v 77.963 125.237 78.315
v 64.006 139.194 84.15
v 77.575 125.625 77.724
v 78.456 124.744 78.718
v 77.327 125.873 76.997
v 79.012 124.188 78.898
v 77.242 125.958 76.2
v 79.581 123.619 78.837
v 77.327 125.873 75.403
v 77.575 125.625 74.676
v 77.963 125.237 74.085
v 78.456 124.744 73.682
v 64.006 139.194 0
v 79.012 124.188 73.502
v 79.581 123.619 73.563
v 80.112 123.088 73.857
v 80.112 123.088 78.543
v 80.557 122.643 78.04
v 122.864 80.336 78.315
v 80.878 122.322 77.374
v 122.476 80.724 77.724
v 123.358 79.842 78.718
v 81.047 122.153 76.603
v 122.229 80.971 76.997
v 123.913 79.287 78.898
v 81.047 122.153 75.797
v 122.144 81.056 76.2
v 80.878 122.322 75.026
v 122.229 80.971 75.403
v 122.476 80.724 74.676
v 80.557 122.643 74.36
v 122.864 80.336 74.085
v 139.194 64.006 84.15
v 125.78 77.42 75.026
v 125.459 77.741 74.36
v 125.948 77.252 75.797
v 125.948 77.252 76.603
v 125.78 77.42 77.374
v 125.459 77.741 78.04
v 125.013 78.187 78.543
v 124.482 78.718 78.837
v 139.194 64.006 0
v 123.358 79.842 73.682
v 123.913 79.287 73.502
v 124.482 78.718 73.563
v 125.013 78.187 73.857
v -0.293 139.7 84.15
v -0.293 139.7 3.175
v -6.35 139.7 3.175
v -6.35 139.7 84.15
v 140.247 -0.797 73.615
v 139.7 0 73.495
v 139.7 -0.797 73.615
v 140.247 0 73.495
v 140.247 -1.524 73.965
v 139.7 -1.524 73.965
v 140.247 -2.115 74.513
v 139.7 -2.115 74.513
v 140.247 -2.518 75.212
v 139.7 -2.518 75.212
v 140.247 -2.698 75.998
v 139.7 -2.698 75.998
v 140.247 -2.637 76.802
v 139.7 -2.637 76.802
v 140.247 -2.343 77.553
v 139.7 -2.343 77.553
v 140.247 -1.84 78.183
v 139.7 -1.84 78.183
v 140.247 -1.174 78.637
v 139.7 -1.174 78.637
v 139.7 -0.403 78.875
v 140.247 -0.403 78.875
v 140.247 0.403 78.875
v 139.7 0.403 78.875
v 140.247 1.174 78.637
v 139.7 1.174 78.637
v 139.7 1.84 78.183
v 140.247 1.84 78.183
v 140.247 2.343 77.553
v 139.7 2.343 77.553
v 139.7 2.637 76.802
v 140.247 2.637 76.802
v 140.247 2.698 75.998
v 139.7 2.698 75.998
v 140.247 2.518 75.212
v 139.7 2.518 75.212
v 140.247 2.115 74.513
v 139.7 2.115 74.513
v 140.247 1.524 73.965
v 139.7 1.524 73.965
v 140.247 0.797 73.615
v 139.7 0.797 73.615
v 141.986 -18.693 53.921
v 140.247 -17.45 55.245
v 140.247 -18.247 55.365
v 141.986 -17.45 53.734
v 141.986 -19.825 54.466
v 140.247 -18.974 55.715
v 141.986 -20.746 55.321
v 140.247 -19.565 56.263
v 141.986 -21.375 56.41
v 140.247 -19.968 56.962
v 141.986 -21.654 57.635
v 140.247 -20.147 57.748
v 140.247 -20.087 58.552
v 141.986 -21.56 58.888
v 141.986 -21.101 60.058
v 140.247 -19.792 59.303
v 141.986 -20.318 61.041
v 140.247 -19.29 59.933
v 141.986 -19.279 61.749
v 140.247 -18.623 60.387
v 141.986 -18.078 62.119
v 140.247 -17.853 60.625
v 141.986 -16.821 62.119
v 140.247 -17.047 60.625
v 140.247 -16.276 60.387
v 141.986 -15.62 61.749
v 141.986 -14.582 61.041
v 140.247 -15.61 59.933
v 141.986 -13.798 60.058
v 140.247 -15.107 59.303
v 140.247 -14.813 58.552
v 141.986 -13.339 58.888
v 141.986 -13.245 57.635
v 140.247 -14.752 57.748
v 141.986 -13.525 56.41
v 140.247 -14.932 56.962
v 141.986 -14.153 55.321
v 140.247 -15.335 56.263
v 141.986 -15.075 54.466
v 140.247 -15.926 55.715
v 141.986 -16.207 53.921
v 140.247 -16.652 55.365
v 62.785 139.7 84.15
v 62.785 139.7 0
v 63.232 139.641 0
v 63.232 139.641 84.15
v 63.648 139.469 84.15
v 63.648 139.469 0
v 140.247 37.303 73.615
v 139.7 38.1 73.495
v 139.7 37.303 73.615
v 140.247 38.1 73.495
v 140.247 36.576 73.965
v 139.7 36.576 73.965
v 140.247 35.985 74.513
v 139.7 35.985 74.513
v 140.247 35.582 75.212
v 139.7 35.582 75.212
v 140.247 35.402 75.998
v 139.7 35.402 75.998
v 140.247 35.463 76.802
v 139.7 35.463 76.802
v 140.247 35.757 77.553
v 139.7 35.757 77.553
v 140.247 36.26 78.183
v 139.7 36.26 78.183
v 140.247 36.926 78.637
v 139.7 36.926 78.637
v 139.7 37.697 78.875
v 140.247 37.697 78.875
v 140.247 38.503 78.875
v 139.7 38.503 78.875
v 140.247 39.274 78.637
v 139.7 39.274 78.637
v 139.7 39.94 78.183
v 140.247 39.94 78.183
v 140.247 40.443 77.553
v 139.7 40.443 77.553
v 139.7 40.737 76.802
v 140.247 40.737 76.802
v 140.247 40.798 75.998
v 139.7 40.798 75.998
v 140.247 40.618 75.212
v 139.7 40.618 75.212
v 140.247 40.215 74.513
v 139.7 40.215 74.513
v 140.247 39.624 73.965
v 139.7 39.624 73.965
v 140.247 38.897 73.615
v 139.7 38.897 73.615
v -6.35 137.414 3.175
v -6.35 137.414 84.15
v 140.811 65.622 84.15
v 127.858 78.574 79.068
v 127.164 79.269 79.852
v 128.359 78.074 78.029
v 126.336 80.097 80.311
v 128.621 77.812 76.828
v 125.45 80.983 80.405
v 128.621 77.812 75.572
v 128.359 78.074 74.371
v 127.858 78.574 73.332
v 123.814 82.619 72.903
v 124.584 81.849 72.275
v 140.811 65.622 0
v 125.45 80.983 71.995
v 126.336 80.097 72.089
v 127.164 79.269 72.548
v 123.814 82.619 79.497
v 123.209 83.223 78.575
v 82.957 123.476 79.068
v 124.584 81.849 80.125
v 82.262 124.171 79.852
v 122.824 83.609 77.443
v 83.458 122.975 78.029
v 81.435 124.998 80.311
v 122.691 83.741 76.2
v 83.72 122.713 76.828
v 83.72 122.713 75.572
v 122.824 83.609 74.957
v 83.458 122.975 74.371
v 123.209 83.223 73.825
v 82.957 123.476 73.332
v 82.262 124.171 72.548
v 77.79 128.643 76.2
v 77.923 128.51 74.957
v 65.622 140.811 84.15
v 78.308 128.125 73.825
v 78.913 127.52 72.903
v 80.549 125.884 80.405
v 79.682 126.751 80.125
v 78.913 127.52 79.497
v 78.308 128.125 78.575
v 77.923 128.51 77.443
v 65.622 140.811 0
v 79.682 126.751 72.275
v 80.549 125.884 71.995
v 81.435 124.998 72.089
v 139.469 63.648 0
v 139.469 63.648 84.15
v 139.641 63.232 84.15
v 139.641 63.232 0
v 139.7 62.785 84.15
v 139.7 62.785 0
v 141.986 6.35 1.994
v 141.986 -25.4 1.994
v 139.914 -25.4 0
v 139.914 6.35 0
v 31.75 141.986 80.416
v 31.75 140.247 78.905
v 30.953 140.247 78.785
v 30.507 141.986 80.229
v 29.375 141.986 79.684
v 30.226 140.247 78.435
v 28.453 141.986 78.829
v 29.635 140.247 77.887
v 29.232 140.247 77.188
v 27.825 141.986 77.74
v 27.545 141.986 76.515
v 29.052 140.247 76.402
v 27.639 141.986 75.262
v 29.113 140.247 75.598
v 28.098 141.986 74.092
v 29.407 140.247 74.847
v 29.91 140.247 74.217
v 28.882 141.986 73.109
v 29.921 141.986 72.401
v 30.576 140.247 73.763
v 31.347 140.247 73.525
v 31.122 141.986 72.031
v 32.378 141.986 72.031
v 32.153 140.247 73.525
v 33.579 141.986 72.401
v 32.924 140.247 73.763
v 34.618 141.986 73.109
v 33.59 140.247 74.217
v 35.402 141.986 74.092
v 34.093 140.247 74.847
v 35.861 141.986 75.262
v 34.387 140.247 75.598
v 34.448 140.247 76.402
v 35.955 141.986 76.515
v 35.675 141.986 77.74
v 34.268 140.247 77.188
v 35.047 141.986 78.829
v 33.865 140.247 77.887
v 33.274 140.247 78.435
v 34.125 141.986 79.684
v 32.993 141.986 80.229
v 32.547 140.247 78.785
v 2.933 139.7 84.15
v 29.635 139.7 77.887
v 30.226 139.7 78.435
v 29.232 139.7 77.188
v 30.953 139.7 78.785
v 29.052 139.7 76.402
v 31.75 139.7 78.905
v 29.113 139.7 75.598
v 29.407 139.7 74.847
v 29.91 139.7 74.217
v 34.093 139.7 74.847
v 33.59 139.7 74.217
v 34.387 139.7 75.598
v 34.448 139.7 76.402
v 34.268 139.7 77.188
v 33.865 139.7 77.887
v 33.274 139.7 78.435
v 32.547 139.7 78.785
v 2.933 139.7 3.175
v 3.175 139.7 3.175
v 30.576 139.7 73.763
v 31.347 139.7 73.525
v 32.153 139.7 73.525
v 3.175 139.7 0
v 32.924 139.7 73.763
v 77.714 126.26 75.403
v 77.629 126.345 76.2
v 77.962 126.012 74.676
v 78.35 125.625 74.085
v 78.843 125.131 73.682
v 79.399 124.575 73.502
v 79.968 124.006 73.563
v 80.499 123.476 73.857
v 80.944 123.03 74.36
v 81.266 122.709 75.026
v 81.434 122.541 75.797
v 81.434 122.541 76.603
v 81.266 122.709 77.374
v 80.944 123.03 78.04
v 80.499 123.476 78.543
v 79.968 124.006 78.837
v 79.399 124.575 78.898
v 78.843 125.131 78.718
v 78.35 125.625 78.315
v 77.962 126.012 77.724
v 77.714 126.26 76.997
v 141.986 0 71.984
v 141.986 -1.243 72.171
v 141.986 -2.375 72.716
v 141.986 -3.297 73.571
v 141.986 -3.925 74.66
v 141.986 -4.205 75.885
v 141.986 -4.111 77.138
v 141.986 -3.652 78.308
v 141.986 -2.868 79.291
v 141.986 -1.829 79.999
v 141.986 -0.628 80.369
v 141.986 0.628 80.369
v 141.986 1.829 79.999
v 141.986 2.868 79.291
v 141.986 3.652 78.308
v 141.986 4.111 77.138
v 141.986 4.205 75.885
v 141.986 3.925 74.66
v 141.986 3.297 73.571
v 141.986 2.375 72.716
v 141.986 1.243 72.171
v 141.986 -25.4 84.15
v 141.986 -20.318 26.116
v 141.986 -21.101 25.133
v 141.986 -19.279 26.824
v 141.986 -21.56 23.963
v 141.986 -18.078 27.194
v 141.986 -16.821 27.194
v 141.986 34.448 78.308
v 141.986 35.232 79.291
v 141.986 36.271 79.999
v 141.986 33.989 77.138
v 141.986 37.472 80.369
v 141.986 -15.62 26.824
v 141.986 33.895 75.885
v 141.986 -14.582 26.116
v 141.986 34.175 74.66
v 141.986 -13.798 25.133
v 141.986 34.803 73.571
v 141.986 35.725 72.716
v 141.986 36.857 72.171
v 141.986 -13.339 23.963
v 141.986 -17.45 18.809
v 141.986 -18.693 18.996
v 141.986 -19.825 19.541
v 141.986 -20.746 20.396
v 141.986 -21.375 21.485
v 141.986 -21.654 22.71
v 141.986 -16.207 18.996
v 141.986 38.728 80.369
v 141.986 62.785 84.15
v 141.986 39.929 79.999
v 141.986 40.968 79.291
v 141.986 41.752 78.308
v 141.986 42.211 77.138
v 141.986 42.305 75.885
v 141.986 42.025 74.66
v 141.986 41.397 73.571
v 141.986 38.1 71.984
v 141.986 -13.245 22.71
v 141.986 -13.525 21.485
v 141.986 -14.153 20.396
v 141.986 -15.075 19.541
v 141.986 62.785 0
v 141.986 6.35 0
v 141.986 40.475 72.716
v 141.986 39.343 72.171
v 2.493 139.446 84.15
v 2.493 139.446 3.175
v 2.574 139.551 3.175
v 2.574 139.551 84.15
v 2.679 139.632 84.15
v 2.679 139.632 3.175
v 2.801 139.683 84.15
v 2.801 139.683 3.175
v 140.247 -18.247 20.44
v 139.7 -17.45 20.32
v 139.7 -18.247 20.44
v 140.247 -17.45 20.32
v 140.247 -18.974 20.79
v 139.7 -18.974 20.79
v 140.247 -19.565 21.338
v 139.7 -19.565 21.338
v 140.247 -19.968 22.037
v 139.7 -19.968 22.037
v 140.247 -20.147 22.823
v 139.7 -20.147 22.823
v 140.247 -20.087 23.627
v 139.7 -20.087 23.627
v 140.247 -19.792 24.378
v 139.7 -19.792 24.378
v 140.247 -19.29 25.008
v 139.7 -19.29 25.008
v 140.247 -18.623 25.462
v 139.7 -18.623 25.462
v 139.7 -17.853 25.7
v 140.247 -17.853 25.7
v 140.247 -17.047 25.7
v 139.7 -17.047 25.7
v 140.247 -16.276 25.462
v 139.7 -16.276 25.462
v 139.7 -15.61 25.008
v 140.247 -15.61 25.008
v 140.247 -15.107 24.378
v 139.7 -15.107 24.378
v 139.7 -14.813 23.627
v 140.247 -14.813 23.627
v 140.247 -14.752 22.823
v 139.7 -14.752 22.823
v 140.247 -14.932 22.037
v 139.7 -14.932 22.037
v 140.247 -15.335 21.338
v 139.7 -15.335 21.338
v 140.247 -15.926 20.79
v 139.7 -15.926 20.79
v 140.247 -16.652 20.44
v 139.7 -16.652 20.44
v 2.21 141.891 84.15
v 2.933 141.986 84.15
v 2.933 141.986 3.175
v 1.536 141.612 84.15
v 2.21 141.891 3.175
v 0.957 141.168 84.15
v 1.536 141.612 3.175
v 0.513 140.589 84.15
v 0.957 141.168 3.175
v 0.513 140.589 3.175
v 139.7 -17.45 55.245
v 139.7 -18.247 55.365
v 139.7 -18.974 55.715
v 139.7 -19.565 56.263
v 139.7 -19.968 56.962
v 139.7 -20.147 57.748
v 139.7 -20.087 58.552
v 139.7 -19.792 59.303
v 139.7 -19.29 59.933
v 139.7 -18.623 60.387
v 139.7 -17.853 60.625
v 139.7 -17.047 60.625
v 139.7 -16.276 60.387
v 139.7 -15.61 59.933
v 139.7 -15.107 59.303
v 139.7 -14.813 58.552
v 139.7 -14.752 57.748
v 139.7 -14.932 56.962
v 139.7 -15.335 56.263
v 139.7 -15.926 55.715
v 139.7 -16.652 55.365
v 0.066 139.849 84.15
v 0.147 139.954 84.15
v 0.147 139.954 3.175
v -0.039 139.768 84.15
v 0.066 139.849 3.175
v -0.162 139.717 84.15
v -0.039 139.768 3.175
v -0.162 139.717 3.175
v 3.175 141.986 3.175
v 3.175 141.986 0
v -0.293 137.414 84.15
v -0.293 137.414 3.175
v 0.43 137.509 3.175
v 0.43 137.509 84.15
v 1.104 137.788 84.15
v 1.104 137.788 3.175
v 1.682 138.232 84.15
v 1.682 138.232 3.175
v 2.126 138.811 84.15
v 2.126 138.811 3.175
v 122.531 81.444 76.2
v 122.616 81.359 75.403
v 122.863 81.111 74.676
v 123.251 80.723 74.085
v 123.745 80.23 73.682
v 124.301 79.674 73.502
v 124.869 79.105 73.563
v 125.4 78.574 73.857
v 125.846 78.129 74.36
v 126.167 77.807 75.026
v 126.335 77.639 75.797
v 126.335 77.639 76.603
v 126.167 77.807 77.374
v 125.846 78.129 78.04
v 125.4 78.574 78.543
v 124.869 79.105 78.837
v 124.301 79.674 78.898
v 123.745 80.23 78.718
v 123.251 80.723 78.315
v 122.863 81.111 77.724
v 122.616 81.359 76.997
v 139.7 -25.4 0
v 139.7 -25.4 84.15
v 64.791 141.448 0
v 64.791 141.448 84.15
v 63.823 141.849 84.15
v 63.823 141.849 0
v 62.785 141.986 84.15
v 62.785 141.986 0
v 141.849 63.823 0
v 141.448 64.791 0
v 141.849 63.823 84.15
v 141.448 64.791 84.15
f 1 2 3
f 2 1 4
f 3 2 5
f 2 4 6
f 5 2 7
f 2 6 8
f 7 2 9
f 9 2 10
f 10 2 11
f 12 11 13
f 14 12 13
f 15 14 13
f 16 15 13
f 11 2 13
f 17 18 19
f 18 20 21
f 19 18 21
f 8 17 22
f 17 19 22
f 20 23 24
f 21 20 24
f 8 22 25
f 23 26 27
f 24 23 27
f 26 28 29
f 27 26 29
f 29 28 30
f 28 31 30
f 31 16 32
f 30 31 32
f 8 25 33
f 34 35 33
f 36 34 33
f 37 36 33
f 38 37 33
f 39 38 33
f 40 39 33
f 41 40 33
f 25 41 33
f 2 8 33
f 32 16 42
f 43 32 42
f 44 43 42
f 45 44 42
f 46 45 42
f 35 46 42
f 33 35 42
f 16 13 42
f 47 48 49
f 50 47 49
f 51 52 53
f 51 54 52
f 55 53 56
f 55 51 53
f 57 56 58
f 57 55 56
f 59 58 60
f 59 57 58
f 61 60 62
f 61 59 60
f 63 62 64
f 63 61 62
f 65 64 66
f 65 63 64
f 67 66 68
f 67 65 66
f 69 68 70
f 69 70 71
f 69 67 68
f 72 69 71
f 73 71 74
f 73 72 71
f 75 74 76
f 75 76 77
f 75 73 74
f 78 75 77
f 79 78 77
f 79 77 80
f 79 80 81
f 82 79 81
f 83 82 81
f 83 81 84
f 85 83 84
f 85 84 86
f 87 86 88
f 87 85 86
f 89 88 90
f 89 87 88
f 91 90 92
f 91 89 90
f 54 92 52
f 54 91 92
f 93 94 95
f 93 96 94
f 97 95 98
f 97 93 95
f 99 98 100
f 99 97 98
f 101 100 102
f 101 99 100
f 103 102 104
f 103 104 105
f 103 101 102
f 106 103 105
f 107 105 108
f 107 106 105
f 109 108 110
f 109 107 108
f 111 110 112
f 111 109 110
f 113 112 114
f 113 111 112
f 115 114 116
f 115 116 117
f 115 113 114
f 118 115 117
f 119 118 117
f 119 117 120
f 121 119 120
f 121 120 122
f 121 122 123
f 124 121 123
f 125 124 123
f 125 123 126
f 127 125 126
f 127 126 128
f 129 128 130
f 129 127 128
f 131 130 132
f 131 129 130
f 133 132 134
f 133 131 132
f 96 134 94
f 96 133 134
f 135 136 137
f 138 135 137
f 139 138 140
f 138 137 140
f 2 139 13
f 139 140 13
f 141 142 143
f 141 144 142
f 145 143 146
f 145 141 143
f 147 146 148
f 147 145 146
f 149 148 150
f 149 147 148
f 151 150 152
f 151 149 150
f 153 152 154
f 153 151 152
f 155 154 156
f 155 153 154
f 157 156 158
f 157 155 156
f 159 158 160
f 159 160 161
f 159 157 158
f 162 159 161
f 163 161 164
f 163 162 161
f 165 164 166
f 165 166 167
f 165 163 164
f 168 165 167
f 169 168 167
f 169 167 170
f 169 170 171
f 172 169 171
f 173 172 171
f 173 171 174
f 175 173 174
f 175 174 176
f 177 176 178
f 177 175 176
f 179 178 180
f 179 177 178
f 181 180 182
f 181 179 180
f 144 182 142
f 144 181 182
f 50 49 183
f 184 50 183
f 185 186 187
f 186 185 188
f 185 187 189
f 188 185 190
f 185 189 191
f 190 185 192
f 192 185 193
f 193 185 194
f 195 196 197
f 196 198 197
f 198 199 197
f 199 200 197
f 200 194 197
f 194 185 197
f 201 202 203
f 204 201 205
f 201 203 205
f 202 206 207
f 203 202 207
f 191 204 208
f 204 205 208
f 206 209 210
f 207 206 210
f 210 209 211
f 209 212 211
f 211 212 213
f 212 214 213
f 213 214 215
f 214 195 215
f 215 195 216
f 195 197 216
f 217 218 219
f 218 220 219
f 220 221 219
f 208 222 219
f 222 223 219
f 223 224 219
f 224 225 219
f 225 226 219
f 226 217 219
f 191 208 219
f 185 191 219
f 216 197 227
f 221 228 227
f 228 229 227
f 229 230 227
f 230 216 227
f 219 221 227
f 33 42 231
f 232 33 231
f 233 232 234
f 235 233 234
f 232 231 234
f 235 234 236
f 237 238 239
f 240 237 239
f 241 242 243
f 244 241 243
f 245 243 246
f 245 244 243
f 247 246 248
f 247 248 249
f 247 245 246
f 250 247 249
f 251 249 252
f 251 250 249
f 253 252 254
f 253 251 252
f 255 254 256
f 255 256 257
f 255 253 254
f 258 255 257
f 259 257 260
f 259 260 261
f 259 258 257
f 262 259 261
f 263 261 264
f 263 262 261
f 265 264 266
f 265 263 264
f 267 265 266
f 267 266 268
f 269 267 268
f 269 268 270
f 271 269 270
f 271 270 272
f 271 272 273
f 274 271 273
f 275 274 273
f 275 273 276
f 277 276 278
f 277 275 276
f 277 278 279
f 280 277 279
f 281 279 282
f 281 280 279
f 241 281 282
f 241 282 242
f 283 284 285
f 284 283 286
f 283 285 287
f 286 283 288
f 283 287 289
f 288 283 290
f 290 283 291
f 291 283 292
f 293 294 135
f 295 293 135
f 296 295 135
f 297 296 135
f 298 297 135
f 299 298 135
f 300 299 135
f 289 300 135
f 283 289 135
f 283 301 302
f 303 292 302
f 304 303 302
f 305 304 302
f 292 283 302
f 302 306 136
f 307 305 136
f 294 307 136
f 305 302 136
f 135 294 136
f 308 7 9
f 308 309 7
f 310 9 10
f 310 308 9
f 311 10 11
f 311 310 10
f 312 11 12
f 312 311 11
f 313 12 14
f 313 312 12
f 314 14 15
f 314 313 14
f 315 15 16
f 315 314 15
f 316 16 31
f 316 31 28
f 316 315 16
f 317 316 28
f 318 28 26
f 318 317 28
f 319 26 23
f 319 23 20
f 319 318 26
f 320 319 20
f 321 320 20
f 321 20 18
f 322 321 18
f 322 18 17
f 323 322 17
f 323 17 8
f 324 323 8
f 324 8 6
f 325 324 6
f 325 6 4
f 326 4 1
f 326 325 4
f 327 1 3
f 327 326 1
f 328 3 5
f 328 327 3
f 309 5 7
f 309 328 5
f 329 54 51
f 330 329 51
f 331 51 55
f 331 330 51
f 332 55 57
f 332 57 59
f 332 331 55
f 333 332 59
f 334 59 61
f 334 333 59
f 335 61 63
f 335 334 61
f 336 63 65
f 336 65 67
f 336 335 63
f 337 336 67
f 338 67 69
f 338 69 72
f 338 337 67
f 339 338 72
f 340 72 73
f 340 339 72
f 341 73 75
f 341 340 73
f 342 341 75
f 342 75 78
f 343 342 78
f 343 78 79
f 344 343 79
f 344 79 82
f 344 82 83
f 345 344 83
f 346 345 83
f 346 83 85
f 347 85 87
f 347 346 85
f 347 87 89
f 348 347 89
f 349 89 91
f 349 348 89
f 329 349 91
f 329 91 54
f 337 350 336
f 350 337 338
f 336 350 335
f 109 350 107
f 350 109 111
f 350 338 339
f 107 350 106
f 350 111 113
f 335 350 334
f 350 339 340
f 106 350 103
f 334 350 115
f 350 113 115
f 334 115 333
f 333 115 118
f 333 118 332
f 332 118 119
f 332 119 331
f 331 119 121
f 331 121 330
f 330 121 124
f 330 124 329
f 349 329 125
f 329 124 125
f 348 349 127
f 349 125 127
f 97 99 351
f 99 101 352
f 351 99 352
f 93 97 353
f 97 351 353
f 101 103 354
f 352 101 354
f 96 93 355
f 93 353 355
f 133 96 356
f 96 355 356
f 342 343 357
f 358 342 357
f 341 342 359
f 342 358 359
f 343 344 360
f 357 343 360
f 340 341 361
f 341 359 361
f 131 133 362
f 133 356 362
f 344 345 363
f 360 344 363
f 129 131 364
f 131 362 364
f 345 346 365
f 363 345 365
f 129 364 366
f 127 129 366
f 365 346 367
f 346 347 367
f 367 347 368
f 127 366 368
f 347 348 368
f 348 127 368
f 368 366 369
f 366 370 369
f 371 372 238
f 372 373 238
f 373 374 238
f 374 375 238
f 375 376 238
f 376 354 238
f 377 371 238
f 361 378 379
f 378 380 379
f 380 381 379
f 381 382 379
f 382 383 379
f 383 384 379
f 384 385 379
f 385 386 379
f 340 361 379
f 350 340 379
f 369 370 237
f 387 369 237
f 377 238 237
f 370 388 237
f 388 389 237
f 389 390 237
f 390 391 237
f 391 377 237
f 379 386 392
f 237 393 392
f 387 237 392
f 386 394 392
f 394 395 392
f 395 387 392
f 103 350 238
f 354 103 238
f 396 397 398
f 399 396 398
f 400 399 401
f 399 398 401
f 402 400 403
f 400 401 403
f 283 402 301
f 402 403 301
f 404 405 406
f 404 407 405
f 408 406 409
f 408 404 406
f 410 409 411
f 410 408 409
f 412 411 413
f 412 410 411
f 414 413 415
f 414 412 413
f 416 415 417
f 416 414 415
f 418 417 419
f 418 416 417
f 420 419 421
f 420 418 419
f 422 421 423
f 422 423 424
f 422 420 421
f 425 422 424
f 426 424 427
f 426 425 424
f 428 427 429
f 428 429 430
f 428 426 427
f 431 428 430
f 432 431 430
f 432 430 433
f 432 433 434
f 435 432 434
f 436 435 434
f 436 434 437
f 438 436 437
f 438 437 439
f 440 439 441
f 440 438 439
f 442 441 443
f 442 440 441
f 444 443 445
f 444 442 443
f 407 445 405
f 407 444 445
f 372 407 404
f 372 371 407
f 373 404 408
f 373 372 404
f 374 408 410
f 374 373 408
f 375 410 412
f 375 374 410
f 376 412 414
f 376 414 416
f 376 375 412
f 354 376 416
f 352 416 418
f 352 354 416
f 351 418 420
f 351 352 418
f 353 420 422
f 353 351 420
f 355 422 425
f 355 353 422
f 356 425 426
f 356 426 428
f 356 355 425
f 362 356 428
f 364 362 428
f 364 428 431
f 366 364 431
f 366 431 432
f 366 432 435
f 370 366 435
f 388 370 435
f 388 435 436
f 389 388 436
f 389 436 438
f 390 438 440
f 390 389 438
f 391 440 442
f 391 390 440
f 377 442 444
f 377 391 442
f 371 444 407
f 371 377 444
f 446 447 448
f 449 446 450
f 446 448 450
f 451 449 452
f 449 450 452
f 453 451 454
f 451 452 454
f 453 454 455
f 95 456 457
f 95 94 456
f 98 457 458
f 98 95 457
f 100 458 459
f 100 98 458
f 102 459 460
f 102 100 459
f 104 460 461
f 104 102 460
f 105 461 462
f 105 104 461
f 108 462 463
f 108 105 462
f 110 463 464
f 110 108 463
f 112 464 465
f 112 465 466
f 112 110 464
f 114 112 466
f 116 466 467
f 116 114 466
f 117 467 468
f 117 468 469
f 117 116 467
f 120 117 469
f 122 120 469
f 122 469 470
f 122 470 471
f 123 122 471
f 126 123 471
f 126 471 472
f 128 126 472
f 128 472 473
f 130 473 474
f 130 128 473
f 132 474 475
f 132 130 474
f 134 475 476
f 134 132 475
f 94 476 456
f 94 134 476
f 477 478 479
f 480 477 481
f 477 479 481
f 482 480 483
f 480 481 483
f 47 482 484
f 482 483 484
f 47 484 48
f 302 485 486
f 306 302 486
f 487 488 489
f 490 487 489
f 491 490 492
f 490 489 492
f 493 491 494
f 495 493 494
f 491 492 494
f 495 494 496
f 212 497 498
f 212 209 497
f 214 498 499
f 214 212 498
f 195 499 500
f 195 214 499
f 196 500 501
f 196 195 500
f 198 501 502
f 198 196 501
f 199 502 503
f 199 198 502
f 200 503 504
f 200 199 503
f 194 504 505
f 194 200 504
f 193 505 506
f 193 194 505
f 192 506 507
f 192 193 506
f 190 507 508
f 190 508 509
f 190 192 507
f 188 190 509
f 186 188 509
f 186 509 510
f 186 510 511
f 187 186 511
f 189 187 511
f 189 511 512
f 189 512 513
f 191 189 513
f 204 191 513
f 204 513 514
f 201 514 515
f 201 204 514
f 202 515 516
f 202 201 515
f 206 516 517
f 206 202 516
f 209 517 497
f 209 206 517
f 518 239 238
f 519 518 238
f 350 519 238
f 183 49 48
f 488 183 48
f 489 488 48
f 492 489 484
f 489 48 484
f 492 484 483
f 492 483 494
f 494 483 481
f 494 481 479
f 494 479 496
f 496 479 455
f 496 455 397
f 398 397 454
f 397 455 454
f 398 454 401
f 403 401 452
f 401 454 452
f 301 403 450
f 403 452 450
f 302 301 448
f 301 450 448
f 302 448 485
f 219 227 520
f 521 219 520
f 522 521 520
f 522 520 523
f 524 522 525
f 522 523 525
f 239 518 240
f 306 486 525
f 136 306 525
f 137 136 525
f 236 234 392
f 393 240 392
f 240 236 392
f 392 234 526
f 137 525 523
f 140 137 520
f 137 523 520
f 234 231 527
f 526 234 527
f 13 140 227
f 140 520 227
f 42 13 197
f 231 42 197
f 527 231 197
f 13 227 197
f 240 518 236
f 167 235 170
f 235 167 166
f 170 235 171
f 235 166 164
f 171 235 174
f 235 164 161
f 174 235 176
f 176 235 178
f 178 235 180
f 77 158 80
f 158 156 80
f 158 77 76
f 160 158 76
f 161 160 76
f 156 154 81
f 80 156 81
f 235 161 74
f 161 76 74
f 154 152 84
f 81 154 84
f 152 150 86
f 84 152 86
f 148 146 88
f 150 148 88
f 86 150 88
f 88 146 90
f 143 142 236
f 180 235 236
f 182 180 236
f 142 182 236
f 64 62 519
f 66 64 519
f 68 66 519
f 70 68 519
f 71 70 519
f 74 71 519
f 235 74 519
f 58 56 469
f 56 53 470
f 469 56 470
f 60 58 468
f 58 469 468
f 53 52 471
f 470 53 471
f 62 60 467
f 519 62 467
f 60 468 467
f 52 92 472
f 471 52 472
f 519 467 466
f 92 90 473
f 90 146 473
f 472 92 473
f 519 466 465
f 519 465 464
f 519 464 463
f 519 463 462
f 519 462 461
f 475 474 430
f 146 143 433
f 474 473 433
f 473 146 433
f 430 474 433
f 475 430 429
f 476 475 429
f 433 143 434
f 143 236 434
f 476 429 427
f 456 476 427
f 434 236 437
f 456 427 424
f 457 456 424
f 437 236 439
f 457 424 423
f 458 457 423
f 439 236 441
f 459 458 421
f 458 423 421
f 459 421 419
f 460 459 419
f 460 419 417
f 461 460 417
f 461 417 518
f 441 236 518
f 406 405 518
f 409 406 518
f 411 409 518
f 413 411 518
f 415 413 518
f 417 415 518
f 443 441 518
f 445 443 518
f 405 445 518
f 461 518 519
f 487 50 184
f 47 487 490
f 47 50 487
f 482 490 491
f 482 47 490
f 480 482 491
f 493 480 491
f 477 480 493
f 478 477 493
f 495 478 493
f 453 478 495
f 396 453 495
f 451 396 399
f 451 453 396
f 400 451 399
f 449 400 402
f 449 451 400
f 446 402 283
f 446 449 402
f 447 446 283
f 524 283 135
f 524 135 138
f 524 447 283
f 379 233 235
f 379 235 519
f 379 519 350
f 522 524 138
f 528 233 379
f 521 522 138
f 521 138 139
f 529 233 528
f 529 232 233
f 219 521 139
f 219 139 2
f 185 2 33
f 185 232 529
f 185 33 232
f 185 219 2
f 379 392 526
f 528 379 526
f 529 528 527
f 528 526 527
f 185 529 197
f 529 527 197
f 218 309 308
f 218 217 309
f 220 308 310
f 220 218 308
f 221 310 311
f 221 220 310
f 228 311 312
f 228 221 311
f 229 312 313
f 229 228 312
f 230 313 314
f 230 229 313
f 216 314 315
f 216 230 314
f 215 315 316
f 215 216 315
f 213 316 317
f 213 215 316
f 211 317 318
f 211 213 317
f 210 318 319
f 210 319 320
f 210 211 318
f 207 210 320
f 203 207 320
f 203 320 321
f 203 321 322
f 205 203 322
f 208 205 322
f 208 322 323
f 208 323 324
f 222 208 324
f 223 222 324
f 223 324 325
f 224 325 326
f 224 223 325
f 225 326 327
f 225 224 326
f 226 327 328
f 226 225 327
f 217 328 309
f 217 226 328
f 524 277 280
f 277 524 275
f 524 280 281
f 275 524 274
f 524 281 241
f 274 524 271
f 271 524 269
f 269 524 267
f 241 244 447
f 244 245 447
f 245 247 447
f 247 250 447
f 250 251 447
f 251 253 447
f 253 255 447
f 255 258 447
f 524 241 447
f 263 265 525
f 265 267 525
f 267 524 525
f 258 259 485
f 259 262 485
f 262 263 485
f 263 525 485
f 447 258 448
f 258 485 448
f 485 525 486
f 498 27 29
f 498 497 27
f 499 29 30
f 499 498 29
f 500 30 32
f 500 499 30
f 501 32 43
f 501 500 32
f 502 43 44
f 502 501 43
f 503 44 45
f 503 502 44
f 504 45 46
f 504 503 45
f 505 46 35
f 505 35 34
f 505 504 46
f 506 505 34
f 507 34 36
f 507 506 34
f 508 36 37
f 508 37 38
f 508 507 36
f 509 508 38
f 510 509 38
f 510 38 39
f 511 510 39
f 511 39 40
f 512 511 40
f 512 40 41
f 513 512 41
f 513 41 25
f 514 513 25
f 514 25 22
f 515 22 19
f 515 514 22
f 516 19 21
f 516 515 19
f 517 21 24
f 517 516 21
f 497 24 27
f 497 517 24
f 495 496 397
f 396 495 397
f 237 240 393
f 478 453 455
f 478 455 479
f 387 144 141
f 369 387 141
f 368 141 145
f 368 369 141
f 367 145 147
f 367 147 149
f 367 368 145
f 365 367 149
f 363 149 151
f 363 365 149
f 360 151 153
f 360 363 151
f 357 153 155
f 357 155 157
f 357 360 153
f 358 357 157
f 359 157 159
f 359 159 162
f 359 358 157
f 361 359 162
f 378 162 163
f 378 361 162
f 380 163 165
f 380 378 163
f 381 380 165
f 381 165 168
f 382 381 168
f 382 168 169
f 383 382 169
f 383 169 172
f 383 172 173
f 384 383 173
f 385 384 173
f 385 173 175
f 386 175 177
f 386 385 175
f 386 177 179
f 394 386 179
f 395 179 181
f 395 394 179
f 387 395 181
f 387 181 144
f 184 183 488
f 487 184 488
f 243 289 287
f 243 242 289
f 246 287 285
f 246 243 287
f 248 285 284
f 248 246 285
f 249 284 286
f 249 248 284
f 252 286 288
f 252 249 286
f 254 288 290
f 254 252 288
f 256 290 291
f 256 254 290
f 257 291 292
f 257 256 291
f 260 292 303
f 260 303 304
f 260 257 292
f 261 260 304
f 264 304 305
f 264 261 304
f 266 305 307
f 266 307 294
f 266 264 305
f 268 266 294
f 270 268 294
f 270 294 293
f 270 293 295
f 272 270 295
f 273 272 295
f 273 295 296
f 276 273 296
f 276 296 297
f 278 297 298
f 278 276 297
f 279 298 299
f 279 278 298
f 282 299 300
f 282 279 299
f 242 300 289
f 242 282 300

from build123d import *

# Parameters (mm, degrees)
BASE_FLANGE1_DEPTH                            = 84.1502
CSK_FOR_8_FLAT_HEAD_MACHINE_SCREW1_AT_2_COUNT = 2
CSK_FOR_8_FLAT_HEAD_MACHINE_SCREW1_AT_2_PITCH = 34.925
CSK_FOR_8_FLAT_HEAD_MACHINE_SCREW2_AT_2_COUNT = 2
CSK_FOR_8_FLAT_HEAD_MACHINE_SCREW2_AT_2_PITCH = 38.1
CSK_FOR_8_FLAT_HEAD_MACHINE_SCREW3_AT_2_COUNT = 2
CSK_FOR_8_FLAT_HEAD_MACHINE_SCREW3_AT_2_PITCH = 63.5
SKETCH13_W                                    = 37.425471778
SKETCH13_H                                    = 23.818222608
CUT_EXTRUDE2_DEPTH                            = 7.62
CUT_EXTRUDE3_DEPTH                            = 31.75


# Read off the part's stored shape, not the designer's step: Base-Flange1
with BuildPart() as part:
    # Base-Flange1 outline → Base-Flange1 (new body)
    with BuildSketch(Plane.XY):
        with BuildLine():
            Line((-0.293293937, 139.7), (-6.35, 139.7))
            Line((-6.35, 139.7), (-6.35, 137.414))
            Line((-6.35, 137.414), (-0.293293937, 137.414))
            ThreePointArc((-0.293293937, 137.414), (1.103706063, 137.788325022), (2.126381041, 138.811))
            Line((2.126381041, 138.811), (2.492998462, 139.446))
            ThreePointArc((2.492998462, 139.446), (2.678939367, 139.631940905), (2.932939367, 139.7))
            Line((2.932939367, 139.7), (62.784570335, 139.7))
            ThreePointArc((62.784570335, 139.7), (63.44554116, 139.568524729), (64.005885168, 139.194114832))
            Line((64.005885168, 139.194114832), (139.194114832, 64.005885168))
            ThreePointArc((139.194114832, 64.005885168), (139.568524729, 63.44554116), (139.7, 62.784570335))
            Line((139.7, 62.784570335), (139.7, -25.4))
            Line((139.7, -25.4), (141.986, -25.4))
            Line((141.986, -25.4), (141.986, 62.784570335))
            ThreePointArc((141.986, 62.784570335), (141.68051334, 64.320355486), (140.810560934, 65.622331269))
            Line((140.810560934, 65.622331269), (65.622331269, 140.810560934))
            ThreePointArc((65.622331269, 140.810560934), (64.320355486, 141.68051334), (62.784570335, 141.986))
            Line((62.784570335, 141.986), (2.932939367, 141.986))
            ThreePointArc((2.932939367, 141.986), (1.535939367, 141.611674978), (0.513264389, 140.589))
            Line((0.513264389, 140.589), (0.146646968, 139.954))
            ThreePointArc((0.146646968, 139.954), (-0.039293937, 139.768059095), (-0.293293937, 139.7))
        make_face()
    extrude(amount=BASE_FLANGE1_DEPTH)

    # Sketch2 → CSK for #8 Flat Head Machine Screw1 (revolve, cut)
    with BuildSketch(Plane(origin=(141.986, -17.4498, 57.9501), x_dir=(0, 0, -1), z_dir=(0, 1, 0))):
        Polygon((0, 0), (0, 2.286), (2.7051, 2.286), (2.7051, 1.738551774), (4.2164, 0), align=None)
    csk_for_8_flat_head_machine_screw1 = revolve(axis=Axis((148.336, -17.4498, 57.9501), (-1, 0, 0)), mode=Mode.SUBTRACT)

    # CSK for #8 Flat Head Machine Screw1 at 2: CSK for #8 Flat Head Machine Screw1 ×2
    with Locations(*[(0, 0, -i * CSK_FOR_8_FLAT_HEAD_MACHINE_SCREW1_AT_2_PITCH) for i in range(1, CSK_FOR_8_FLAT_HEAD_MACHINE_SCREW1_AT_2_COUNT)]):
        add(csk_for_8_flat_head_machine_screw1, mode=Mode.SUBTRACT)

    # Sketch6 → CSK for #8 Flat Head Machine Screw2 (revolve, cut)
    with BuildSketch(Plane(origin=(141.986, 0, 76.2), x_dir=(0, 0, -1), z_dir=(0, 1, 0))):
        Polygon((0, 0), (0, 2.286), (2.7051, 2.286), (2.7051, 1.738551774), (4.2164, 0), align=None)
    csk_for_8_flat_head_machine_screw2 = revolve(axis=Axis((148.336, 0, 76.2), (-1, 0, 0)), mode=Mode.SUBTRACT)

    # CSK for #8 Flat Head Machine Screw2 at 2: CSK for #8 Flat Head Machine Screw2 ×2
    with Locations(*[(0, i * CSK_FOR_8_FLAT_HEAD_MACHINE_SCREW2_AT_2_PITCH, 0) for i in range(1, CSK_FOR_8_FLAT_HEAD_MACHINE_SCREW2_AT_2_COUNT)]):
        add(csk_for_8_flat_head_machine_screw2, mode=Mode.SUBTRACT)

    # Sketch8 → CSK for #8 Flat Head Machine Screw3 (revolve, cut)
    with BuildSketch(Plane(origin=(125.672839939, 80.760052265, 76.2), x_dir=(-0.707106781186544, 0.7071067811865511, 0), z_dir=(0, 0, 1))):
        Polygon((0, 0), (0, 2.286), (2.7051, 2.286), (2.7051, 1.738551774), (4.2164, 0), align=None)
    csk_for_8_flat_head_machine_screw3 = revolve(axis=Axis((130.162967999, 85.250180325, 76.2), (-0.707106781186551, -0.707106781186544, 0)), mode=Mode.SUBTRACT)

    # CSK for #8 Flat Head Machine Screw3 at 2: CSK for #8 Flat Head Machine Screw3 ×2
    with Locations(*[Vector(-0.707106781186544, 0.707106781186551, 0) * (i * CSK_FOR_8_FLAT_HEAD_MACHINE_SCREW3_AT_2_PITCH) for i in range(1, CSK_FOR_8_FLAT_HEAD_MACHINE_SCREW3_AT_2_COUNT)]):
        add(csk_for_8_flat_head_machine_screw3, mode=Mode.SUBTRACT)

    # Sketch10 → CSK for #8 Flat Head Machine Screw4 (revolve, cut)
    with BuildSketch(Plane(origin=(31.75, 141.986, 76.2), x_dir=(0, 0, 1), z_dir=(1, 0, 0))):
        Polygon((0, 0), (0, 2.286), (2.7051, 2.286), (2.7051, 1.738551774), (4.2164, 0), align=None)
    revolve(axis=Axis((31.75, 148.336, 76.2), (0, -1, 0)), mode=Mode.SUBTRACT)

    # Sketch13 → Cut-Extrude2 (cut)
    with BuildSketch(Plane(origin=(0, 141.986, 0), x_dir=(1, 0, 0), z_dir=(0, 1, 0))):
        with Locations((-15.537735889, 8.734111304)):
            Rectangle(SKETCH13_W, SKETCH13_H)
    extrude(amount=-CUT_EXTRUDE2_DEPTH, mode=Mode.SUBTRACT)

    # Sketch14 → Cut-Extrude3 (cut)
    with BuildSketch(Plane.XZ.offset(25.4)):
        Polygon((148.11255662, 7.890869199), (135.614154543, -4.139010601), (148.11255662, -4.61665654), align=None)
    extrude(amount=-CUT_EXTRUDE3_DEPTH, mode=Mode.SUBTRACT)


solid = part.part
